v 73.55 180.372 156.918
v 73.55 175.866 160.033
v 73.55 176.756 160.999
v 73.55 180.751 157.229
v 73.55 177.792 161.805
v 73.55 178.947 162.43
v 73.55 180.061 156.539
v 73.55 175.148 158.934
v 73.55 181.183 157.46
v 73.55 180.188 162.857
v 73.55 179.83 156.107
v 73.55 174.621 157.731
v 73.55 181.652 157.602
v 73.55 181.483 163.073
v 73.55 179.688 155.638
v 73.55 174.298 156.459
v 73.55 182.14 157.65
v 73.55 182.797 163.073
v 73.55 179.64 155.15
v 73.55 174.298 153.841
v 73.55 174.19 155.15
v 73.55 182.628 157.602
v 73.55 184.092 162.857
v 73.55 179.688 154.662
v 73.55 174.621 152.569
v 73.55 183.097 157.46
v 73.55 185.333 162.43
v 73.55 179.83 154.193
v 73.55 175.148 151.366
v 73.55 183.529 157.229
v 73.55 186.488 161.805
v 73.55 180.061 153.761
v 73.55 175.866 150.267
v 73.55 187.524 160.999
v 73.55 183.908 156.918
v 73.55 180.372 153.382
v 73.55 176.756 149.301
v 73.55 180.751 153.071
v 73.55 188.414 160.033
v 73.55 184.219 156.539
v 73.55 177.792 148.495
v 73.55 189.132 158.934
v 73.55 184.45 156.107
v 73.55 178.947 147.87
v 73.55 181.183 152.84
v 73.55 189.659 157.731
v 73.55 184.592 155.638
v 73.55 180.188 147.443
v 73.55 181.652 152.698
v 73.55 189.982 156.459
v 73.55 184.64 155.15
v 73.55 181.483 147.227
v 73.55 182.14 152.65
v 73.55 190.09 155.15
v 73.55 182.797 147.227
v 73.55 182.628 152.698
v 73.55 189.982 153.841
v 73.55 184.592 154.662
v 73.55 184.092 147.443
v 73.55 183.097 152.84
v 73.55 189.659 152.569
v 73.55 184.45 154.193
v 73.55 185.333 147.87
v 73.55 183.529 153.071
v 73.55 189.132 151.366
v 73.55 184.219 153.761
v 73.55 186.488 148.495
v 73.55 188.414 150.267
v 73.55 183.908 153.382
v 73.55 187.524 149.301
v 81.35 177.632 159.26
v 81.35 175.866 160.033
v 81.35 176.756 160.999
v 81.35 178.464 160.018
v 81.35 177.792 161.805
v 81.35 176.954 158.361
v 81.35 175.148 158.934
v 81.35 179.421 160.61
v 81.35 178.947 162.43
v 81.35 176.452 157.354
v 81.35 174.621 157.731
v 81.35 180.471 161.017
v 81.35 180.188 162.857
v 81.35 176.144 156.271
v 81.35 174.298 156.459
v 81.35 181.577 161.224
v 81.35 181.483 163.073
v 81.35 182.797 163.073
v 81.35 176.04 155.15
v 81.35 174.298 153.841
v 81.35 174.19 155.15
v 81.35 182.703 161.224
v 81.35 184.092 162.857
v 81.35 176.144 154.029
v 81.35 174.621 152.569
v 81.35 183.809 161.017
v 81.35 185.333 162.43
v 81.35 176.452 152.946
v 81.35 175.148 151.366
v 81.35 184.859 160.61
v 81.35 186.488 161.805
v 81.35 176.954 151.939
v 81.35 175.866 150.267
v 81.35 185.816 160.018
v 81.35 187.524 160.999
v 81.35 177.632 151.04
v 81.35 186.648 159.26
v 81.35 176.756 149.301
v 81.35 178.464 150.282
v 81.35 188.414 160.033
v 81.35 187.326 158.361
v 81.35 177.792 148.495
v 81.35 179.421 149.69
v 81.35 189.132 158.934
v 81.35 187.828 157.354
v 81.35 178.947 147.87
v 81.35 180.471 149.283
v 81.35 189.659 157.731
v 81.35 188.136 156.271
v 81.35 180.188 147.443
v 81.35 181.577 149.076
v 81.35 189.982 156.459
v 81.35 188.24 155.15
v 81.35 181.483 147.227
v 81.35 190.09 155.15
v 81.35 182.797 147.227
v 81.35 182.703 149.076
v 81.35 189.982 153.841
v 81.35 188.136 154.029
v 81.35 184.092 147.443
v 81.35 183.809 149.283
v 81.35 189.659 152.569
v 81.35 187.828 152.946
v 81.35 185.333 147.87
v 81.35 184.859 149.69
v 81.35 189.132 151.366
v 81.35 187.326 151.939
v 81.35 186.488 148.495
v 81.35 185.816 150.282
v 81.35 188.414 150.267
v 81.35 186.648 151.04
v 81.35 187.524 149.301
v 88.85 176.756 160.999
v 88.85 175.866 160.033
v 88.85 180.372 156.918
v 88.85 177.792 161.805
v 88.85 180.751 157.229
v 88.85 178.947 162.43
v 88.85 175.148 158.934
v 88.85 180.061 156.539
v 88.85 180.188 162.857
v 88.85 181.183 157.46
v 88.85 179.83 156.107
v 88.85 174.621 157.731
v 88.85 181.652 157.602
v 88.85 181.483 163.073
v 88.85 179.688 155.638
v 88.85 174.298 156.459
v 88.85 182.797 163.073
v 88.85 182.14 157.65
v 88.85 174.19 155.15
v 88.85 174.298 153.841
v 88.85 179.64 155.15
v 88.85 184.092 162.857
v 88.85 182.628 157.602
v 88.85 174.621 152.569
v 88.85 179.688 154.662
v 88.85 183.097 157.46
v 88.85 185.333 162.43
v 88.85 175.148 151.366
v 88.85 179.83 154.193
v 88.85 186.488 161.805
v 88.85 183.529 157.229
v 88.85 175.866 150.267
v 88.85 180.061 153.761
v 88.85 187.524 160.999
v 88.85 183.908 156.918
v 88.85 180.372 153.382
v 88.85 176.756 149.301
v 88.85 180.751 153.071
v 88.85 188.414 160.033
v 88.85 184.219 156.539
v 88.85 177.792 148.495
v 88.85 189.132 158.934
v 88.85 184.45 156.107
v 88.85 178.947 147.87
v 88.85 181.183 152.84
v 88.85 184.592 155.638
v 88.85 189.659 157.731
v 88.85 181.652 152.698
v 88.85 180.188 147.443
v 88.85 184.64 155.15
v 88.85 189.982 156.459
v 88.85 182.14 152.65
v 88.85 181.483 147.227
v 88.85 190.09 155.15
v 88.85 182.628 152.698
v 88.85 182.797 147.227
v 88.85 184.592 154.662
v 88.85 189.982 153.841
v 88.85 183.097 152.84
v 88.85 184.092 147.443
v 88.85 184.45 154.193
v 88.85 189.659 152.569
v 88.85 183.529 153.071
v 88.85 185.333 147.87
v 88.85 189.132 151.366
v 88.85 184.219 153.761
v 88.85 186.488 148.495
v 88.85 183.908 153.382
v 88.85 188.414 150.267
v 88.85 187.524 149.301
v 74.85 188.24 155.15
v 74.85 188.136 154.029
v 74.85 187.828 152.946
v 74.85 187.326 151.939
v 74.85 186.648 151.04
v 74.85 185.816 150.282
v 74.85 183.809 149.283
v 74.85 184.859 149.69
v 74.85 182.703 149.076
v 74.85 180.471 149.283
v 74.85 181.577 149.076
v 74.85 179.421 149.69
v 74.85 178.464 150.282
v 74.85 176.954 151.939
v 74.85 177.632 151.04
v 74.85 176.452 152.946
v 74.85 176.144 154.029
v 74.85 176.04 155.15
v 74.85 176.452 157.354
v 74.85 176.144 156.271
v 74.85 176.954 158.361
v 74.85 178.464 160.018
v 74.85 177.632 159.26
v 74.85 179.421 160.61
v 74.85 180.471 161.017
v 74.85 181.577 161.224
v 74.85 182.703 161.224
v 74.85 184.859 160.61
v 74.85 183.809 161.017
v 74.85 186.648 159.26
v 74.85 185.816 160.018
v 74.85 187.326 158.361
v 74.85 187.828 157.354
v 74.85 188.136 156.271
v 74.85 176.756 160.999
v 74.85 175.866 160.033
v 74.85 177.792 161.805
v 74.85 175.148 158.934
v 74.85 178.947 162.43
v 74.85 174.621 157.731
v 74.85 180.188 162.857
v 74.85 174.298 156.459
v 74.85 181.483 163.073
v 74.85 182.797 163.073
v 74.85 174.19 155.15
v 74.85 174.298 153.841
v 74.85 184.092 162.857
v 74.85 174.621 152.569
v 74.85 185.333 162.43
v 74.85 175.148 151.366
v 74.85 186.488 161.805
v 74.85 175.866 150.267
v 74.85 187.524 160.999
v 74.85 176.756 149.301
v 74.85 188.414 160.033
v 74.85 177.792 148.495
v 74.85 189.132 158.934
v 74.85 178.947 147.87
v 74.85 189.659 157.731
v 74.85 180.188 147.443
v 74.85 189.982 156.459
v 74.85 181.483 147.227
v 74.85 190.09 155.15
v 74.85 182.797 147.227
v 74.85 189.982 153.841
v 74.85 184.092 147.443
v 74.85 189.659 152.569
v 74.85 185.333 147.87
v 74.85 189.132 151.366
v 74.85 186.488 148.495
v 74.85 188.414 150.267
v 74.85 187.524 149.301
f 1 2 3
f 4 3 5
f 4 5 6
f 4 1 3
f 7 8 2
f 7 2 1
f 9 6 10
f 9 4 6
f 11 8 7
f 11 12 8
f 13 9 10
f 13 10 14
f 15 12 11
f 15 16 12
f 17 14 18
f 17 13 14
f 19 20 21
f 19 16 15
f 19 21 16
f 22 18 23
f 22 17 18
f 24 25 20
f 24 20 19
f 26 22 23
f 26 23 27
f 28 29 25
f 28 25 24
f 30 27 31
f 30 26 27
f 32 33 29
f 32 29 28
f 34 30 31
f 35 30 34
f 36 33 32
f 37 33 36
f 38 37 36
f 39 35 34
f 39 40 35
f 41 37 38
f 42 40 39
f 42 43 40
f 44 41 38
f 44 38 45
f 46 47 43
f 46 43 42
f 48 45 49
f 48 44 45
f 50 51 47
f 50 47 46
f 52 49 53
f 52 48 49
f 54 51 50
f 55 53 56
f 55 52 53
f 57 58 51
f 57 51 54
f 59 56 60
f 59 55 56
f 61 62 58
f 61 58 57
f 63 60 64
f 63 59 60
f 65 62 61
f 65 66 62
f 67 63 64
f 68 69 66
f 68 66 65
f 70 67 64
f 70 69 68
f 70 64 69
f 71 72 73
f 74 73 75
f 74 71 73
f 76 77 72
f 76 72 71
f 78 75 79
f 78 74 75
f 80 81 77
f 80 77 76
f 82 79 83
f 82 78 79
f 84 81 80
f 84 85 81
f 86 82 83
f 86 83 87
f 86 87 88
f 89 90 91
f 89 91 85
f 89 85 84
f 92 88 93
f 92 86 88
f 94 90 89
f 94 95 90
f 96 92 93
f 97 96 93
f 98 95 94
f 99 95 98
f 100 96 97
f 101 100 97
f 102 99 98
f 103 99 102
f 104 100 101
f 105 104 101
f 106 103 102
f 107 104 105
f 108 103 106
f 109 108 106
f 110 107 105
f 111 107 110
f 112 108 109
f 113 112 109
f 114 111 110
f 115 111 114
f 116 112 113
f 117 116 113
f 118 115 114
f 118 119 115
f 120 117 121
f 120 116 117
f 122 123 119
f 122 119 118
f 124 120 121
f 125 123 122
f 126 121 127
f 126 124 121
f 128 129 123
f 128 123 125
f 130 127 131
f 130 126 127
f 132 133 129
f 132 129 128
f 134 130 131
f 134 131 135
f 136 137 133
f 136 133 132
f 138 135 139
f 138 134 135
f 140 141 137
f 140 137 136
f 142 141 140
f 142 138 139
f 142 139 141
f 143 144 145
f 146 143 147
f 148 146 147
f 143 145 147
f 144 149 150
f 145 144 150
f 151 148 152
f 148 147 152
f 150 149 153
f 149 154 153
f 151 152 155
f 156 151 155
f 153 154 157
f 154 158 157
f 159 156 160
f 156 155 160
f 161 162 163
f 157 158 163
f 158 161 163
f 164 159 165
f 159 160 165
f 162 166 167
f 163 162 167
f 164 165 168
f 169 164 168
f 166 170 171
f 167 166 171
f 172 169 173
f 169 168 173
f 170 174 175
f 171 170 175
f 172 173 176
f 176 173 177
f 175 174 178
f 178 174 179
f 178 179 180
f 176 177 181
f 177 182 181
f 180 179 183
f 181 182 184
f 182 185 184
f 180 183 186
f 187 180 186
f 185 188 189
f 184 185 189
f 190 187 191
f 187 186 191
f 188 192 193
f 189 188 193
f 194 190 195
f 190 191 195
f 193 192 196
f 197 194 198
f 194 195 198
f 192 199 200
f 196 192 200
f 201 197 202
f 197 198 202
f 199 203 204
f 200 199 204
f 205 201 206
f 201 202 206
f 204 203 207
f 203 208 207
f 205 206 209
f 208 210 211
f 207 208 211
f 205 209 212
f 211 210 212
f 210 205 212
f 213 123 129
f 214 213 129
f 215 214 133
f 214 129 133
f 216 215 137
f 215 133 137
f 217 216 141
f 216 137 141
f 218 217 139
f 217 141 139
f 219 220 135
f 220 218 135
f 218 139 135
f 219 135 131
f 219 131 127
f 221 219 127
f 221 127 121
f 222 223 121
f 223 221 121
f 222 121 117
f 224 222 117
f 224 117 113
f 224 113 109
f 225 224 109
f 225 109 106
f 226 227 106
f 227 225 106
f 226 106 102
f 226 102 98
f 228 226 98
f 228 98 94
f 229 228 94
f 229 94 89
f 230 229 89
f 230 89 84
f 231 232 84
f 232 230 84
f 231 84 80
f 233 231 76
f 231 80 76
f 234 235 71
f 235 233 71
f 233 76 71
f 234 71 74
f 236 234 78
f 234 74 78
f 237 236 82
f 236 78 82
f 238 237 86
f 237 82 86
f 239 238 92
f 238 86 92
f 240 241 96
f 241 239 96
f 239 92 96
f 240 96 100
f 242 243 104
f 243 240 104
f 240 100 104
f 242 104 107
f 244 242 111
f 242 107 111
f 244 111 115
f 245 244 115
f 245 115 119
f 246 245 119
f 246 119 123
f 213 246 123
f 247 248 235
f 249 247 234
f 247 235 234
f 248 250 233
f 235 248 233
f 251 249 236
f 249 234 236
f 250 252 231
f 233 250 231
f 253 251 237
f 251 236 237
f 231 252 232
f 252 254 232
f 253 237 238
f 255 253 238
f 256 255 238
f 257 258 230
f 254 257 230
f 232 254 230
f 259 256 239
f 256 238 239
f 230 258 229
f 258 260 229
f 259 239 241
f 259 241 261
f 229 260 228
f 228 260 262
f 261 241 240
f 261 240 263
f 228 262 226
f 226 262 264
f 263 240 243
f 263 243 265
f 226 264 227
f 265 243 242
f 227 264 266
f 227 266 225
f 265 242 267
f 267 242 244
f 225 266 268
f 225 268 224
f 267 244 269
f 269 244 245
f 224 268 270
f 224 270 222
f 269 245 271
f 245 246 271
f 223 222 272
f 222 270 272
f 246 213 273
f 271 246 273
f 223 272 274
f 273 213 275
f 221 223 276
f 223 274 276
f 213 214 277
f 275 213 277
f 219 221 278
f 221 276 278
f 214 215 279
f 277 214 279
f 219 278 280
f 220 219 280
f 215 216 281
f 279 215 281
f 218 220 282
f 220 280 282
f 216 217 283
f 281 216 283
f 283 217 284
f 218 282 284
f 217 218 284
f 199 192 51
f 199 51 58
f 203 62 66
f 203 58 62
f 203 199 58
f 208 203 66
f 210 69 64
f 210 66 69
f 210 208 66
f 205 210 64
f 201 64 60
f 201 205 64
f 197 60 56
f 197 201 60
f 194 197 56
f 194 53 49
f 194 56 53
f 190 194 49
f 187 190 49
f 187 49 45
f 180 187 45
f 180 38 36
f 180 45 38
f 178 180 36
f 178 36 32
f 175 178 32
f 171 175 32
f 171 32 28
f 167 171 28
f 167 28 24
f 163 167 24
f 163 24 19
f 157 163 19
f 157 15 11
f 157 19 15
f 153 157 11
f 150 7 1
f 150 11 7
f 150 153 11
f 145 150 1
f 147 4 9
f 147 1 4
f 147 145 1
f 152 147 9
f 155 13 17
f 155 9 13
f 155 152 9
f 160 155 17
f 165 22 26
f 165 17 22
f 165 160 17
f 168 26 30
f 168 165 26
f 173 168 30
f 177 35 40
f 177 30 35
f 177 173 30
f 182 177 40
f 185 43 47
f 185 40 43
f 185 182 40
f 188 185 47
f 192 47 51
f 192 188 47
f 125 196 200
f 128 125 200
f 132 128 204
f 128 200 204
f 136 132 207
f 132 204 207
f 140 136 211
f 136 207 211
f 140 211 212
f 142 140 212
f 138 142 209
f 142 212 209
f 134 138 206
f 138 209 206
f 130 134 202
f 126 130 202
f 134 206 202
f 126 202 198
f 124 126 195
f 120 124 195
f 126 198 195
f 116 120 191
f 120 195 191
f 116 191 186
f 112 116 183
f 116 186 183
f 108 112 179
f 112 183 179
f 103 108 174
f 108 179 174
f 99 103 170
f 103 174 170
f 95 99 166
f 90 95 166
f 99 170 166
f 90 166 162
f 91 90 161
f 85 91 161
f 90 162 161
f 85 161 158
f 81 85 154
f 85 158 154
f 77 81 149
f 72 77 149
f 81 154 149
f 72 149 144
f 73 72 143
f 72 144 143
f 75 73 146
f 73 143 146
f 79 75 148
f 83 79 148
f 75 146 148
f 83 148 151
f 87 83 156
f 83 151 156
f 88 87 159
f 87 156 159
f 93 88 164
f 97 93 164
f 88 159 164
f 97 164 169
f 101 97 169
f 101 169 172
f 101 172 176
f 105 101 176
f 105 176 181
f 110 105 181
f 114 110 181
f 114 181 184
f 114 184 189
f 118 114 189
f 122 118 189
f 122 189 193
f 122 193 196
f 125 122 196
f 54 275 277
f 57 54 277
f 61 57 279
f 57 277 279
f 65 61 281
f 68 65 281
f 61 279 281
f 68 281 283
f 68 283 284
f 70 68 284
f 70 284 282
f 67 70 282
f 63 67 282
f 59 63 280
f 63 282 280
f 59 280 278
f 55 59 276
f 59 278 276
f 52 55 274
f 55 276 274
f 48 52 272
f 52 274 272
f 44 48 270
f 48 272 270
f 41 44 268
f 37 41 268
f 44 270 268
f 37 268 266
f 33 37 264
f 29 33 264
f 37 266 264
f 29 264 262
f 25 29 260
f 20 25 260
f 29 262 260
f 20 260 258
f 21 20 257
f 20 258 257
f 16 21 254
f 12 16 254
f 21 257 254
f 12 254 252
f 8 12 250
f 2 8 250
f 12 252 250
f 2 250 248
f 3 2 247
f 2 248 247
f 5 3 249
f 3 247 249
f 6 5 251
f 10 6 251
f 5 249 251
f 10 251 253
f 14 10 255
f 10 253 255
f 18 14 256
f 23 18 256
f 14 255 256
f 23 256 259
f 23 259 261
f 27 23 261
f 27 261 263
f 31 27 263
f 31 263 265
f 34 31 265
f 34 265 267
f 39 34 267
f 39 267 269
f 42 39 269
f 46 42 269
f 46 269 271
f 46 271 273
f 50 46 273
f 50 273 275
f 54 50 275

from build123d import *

# Parameters (mm, degrees)
CYLINDER271_R          = 2.5
CYLINDER271_DEPTH      = 19.2
CYLINDER272_R          = 6.1
CYLINDER272_DEPTH      = 7.2
CYLINDER273_R          = 7.95
CYLINDER273_DEPTH      = 1.3
CYLINDER270_R          = 7.95
CYLINDER270_DEPTH      = 7.5
CUT197_ROLL_ANGLE      = -90
CUT197_PLACEMENT_ANGLE = 90


with BuildPart() as cylinder271:
    # Cylinder271 → Cylinder271 (new body)
    with BuildSketch(Plane.XY.offset(-2)):
        Circle(CYLINDER271_R)
    extrude(amount=CYLINDER271_DEPTH)


with BuildPart() as cylinder272:
    # Cylinder272 → Cylinder272 (new body)
    with BuildSketch(Plane.XY.offset(7)):
        Circle(CYLINDER272_R)
    extrude(amount=CYLINDER272_DEPTH)


with BuildPart() as cylinder273:
    # Cylinder273 → Cylinder273 (new body)
    with BuildSketch(Plane.XY.offset(14)):
        Circle(CYLINDER273_R)
    extrude(amount=CYLINDER273_DEPTH)


with BuildPart() as cut197:
    # Cylinder270 → Cylinder270 (new body)
    with BuildSketch(Plane.XY):
        Circle(CYLINDER270_R)
    extrude(amount=CYLINDER270_DEPTH)

    # Fusion105: union Cylinder272, Cylinder273
    add(cylinder272.part)
    add(cylinder273.part)

    # Cut197: cut Cylinder271
    add(cylinder271.part, mode=Mode.SUBTRACT)


with BuildPart() as cut197_1:
    # Cut197 roll: moved
    add(cut197.part.rotate(Axis((0, 0, 0), (1, 0, 0)), CUT197_ROLL_ANGLE))


with BuildPart() as cut197_2:
    # Cut197 placement: moved
    add(cut197_1.part.moved(Location((88.85, 182.14, 155.15))).rotate(Axis((88.85, 182.14, 155.15), (0, 0, 1)), CUT197_PLACEMENT_ANGLE))


solid = cut197_2.part
